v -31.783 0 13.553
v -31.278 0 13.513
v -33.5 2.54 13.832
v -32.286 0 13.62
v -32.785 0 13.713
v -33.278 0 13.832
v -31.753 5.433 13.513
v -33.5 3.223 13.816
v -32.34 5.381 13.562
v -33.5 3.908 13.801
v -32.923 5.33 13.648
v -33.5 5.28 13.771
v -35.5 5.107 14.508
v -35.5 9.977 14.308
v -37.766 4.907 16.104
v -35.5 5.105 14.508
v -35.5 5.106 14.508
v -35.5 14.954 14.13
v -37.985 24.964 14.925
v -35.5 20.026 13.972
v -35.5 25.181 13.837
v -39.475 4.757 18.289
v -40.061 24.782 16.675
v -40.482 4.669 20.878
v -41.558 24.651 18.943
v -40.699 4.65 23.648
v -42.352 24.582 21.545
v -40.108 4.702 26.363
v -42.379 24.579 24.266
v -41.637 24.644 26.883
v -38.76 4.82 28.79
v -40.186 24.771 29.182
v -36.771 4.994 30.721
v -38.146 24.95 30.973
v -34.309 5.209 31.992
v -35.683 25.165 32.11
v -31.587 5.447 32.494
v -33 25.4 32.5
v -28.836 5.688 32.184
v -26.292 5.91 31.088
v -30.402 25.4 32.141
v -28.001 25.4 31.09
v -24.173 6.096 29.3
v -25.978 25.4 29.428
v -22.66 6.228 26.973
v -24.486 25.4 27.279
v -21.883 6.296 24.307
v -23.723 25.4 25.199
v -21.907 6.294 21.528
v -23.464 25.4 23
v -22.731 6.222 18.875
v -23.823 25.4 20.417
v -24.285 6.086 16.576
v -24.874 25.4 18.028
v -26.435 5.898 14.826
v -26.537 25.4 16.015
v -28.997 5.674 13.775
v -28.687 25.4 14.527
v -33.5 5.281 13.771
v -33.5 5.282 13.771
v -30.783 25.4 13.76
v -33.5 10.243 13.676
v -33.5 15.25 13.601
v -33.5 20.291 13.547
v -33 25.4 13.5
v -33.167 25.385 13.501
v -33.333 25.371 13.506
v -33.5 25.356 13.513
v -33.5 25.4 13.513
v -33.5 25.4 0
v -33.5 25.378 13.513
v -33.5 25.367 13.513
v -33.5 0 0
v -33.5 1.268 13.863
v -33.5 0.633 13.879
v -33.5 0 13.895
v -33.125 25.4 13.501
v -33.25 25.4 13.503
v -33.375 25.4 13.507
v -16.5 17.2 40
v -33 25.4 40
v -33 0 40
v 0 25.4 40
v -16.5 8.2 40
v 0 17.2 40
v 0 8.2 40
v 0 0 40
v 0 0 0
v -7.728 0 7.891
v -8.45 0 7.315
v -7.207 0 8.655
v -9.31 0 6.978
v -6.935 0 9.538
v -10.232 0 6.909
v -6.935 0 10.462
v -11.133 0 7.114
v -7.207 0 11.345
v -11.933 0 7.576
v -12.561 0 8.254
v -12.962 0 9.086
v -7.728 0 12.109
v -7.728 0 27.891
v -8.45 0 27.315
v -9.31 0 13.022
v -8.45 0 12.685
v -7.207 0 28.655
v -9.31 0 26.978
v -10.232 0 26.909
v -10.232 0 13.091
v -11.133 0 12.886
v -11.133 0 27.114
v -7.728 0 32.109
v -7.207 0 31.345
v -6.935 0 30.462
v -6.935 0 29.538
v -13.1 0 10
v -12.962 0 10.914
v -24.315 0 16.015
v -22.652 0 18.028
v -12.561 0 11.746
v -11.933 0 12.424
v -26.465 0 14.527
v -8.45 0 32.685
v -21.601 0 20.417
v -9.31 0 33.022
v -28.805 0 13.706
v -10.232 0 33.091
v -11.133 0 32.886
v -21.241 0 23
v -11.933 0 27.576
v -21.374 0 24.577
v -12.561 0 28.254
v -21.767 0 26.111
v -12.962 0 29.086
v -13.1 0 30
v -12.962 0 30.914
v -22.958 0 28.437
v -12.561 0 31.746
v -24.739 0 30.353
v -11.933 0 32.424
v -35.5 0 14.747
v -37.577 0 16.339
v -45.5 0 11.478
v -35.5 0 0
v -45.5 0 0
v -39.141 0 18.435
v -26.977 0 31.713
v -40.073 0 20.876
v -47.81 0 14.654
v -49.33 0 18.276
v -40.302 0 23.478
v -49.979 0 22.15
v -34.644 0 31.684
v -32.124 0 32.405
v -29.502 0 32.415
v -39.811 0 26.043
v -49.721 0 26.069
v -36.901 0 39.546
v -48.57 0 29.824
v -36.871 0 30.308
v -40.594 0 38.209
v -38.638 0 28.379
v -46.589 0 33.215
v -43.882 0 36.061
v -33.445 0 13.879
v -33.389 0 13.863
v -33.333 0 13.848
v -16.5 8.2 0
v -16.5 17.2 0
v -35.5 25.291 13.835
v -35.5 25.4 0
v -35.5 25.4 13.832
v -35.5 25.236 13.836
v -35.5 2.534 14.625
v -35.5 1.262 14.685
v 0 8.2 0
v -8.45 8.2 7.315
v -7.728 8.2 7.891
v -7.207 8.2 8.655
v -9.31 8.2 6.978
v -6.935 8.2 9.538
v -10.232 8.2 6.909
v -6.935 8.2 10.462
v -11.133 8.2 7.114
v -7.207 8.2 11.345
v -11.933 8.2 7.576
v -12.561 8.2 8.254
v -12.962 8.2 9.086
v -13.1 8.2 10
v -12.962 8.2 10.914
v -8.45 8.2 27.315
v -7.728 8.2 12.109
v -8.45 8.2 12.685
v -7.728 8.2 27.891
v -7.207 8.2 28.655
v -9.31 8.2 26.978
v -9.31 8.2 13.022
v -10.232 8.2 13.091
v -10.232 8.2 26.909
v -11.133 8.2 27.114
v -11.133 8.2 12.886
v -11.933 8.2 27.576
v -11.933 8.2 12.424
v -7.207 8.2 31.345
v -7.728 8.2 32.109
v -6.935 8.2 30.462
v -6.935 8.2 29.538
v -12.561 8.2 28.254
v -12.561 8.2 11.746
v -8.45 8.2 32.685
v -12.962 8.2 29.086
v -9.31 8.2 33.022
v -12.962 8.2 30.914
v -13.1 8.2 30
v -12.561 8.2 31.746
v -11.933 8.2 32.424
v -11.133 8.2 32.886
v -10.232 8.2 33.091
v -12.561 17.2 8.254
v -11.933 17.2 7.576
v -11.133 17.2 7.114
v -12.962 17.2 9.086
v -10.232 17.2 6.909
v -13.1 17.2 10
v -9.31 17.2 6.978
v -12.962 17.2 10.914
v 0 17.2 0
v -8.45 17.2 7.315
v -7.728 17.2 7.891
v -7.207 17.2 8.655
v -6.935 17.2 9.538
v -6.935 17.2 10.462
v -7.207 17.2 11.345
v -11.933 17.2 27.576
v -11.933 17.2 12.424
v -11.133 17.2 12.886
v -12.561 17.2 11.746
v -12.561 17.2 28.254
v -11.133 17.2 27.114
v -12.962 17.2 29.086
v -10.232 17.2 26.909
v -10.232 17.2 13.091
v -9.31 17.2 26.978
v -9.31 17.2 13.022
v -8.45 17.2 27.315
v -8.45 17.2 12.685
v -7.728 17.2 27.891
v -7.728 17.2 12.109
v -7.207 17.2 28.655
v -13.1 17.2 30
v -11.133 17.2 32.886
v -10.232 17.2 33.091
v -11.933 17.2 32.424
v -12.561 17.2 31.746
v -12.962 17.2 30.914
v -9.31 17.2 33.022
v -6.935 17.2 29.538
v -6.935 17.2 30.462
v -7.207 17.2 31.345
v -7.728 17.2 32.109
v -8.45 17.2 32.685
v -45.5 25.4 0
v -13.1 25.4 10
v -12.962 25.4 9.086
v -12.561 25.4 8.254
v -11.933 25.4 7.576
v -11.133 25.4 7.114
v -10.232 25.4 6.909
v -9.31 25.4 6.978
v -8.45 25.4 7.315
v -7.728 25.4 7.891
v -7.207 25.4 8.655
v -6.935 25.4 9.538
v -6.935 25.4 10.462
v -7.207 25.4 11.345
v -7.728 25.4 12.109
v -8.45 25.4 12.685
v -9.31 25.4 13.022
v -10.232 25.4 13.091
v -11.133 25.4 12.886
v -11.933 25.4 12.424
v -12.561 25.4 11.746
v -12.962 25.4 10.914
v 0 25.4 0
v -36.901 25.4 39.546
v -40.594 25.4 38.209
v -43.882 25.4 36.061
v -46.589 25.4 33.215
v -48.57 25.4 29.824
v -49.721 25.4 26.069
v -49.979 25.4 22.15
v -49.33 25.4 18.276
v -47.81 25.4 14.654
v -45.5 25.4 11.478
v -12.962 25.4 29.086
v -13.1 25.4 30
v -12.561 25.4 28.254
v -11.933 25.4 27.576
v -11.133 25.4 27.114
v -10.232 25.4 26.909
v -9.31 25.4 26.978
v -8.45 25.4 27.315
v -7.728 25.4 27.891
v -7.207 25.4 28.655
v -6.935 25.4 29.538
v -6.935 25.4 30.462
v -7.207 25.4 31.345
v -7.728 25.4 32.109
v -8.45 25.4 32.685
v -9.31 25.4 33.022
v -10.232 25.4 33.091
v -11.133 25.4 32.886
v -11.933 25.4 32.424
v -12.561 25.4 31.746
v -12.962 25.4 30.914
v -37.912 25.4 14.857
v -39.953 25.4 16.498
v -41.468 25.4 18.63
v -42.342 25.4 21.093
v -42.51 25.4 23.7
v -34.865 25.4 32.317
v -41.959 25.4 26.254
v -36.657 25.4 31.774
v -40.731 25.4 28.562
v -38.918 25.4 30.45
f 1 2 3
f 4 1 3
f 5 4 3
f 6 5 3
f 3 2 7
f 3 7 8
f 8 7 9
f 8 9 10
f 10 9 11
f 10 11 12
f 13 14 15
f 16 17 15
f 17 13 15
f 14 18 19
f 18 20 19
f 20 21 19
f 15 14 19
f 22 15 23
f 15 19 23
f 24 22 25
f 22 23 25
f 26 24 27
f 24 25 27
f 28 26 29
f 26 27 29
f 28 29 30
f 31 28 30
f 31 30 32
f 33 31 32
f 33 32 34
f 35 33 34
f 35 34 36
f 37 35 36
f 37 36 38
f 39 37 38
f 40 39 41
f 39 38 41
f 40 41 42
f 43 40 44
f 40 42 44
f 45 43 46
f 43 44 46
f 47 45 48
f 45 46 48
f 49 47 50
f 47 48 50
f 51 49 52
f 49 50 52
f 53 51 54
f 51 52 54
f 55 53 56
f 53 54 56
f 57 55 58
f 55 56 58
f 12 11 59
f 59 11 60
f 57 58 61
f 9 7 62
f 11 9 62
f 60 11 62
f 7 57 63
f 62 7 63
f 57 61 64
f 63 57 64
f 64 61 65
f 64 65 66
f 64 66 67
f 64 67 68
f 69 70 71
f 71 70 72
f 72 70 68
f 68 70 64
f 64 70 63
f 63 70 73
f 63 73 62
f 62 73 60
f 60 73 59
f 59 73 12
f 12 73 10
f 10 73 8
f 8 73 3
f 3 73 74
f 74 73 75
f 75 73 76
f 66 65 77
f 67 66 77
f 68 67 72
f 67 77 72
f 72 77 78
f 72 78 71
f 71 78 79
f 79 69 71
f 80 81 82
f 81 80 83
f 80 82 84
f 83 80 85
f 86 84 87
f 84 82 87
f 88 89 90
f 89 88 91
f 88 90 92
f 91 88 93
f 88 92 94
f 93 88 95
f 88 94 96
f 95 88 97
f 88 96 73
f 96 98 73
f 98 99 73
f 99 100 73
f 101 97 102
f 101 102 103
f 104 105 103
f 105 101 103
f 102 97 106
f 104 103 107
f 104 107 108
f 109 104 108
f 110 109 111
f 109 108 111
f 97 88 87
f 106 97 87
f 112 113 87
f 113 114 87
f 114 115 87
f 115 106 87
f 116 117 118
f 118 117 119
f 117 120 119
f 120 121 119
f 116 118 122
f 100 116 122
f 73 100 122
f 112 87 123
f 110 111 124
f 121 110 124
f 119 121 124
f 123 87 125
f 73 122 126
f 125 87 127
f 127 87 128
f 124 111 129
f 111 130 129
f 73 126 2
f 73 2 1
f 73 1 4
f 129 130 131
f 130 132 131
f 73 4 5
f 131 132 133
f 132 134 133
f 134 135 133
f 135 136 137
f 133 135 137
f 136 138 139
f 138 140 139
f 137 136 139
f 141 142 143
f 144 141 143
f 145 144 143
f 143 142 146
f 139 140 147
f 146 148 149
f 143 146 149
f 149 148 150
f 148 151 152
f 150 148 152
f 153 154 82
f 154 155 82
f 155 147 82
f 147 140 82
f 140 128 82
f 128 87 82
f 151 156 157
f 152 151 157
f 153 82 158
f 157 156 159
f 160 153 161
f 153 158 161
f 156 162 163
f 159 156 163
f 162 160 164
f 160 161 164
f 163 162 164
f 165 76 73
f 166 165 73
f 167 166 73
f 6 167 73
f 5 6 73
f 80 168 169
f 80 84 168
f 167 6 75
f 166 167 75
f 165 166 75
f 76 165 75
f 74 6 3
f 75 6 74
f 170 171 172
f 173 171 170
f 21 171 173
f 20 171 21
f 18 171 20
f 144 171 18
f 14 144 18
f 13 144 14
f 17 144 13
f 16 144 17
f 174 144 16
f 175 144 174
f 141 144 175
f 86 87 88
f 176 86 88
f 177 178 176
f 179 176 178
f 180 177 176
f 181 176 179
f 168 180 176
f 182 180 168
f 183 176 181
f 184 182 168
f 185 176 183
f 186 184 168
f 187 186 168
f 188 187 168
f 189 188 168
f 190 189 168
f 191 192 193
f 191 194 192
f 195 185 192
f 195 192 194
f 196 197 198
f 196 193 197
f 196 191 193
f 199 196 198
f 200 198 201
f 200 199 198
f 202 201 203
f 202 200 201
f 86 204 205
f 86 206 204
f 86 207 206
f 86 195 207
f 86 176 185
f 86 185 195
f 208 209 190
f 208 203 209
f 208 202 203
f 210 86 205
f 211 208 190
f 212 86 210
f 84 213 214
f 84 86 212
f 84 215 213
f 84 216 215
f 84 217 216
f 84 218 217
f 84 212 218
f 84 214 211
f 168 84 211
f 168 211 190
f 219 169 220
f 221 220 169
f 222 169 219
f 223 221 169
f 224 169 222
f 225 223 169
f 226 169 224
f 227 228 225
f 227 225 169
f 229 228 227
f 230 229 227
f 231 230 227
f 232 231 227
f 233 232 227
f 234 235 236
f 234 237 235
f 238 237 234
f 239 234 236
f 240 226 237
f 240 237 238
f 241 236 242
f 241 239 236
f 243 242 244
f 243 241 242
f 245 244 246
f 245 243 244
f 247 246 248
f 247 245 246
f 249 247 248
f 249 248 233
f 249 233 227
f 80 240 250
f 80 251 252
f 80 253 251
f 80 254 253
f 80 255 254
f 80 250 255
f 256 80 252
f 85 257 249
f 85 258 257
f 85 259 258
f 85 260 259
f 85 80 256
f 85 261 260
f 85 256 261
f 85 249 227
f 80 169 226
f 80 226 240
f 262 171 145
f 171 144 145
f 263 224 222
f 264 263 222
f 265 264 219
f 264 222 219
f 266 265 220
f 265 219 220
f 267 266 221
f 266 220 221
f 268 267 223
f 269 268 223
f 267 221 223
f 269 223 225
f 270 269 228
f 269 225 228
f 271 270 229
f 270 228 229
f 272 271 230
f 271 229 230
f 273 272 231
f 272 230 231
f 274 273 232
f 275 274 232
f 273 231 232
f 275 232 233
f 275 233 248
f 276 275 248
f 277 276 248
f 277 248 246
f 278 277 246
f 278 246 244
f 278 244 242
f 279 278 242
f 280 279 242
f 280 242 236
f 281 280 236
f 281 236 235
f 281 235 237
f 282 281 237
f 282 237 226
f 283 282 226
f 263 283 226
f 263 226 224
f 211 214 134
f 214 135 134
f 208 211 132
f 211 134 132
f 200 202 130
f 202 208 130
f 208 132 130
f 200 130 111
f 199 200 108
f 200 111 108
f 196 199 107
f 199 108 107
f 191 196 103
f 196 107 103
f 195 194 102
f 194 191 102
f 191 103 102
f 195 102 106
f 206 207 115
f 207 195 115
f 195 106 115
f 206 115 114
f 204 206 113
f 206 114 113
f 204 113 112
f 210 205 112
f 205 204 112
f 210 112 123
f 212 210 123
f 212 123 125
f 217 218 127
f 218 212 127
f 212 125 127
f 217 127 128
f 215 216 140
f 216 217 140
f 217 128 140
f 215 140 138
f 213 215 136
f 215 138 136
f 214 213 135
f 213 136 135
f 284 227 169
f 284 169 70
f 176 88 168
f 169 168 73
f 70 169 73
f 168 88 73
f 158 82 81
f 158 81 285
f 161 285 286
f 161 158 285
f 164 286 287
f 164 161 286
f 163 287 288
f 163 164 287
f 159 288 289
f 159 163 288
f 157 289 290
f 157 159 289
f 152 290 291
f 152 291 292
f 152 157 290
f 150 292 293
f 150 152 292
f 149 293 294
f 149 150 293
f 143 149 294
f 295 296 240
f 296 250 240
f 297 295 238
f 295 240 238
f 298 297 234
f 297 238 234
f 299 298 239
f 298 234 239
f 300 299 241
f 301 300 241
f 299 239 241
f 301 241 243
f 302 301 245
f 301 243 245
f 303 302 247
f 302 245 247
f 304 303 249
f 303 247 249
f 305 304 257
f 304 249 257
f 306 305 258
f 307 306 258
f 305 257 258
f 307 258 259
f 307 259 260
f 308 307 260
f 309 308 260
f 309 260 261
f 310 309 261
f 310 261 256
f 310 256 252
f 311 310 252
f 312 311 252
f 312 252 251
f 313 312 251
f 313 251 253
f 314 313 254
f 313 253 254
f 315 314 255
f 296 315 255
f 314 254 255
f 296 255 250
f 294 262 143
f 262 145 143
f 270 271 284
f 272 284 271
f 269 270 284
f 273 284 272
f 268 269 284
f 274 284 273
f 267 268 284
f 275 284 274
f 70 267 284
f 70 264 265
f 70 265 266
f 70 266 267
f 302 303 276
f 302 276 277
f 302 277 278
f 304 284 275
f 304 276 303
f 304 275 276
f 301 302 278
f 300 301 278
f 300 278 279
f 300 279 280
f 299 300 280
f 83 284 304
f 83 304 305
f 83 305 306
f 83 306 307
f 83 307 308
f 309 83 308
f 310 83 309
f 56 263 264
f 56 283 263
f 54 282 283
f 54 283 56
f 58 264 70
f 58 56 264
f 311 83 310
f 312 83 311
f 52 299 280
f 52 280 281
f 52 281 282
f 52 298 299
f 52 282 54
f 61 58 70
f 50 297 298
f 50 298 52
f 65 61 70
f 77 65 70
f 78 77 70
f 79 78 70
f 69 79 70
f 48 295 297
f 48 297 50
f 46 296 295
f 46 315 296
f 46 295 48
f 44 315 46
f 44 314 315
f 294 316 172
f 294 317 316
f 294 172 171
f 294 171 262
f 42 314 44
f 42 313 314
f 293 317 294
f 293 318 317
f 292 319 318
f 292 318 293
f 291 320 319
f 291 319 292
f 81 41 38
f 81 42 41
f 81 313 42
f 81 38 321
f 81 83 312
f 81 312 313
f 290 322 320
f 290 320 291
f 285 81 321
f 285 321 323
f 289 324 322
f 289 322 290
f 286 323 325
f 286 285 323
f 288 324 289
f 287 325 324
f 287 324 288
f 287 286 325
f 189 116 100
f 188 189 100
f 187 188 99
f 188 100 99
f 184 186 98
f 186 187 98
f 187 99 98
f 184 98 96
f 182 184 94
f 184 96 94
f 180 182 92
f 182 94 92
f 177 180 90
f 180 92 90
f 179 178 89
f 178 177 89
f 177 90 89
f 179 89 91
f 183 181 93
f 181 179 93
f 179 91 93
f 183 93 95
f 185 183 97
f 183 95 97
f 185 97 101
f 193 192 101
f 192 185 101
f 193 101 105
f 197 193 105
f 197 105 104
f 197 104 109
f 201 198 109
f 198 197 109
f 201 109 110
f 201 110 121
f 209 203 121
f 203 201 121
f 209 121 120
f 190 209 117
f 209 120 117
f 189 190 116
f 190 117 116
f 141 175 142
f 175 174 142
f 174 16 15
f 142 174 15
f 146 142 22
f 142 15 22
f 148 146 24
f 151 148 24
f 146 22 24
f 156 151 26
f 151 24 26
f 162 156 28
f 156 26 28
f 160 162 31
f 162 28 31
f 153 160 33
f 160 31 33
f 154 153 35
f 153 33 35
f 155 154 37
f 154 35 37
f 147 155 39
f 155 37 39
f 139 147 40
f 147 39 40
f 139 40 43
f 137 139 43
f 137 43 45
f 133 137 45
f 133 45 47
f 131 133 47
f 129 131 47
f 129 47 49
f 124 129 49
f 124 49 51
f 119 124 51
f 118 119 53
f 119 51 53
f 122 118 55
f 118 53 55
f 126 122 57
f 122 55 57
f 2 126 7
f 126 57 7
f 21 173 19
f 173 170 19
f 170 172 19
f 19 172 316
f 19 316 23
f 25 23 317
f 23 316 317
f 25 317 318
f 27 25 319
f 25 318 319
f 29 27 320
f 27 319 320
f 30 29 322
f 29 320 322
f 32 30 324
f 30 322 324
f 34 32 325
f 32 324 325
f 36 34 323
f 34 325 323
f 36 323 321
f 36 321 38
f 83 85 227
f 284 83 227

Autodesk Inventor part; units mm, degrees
ref_plane "YZ Plane" through (0, 0, 0) normal (1, 0, 0) x (0, 1, 0)
ref_plane "XZ Plane" through (0, 0, 0) normal (0, 1, 0) x (-1, 0, 0)
ref_plane "XY Plane" through (0, 0, 0) normal (0, 0, 1) x (1, 0, 0)
sketch "Sketch1" plane through (0, 0, 0) normal (0, 1, 0) x (-1, 0, 0)
  line L0 (50, 0) -> (50, 40)
  line L1 (50, 40) -> (0, 40)
  line L2 (0, 40) -> (0, 0)
  line L3 (0, 0) -> (10, 0)
  line L4 (10, 0) -> (10, 10)
  line L5 (10, 10) -> (10, 30)
  circle A0 centre (10, 30) radius 3.1
  circle A1 centre (10, 10) radius 3.1
  line L6 (45.5, 0) -> (45.5, 11.4783)
  line L7 (0, 0) -> (33.5, 0)
  line L8 (35.5, 0) -> (35.5, 18.6699)
  line L9 (50, 40) -> (45.5, 40)
  line L10 (45.5, 40) -> (45.5, 35.5)
  line L11 (45.5, 35.5) -> (45.5, 34.5217)
  line L12 (45.5, 23) -> (33, 23)
  arc A2 (45.5, 11.4783) -> (33, 40) centre (33, 23) ccw
  line L13 (0, 0) -> (33.5, 0)
  line L14 (35.5, 0) -> (45.5, 0)
  line L15 (33.5, 0) -> (33.5, 18.0251)
  line L16 (0, 0) -> (33.5, 0)
  line L17 (35.5, 0) -> (45.5, 0)
  line L18 (33, 23) -> (28, 23)
  line L19 (33, 23) -> (38, 23)
  arc A3 (35.5, 18.6699) -> (38, 23) centre (33, 23) ccw
  arc A4 (28, 23) -> (33.5, 18.0251) centre (33, 23) ccw
  dimension "d0" = 50
  dimension "d1" = 40
  dimension "d2" = 10
  dimension "d3" = 10
  dimension "d4" = 20
  dimension "d5" = 6.2
  dimension "d6" = 6.2
  dimension "d7" = 45.5
  dimension "d8" = 35.5
  dimension "d9" = 4.5
  dimension "d10" = 4.5
  dimension "d13" = 12.5
  dimension "d14" = 12.5
  dimension "d15" = 2
extrude "Extrusion1" add sketch "Sketch1" along normal blind 25.4 contours A2 L6 L14 L8 A3 L12 L18 A4 L15 L7 L3 L2 L1
sketch "Sketch2" plane through (-33, 0, 40) normal (0, 0, 1) x (1, 0, 0)
  line L0 (33, 0) -> (33, 8.2)
  line L1 (33, 0) -> (33, 25.4) projected
  line L2 (33, 8.2) -> (16.5, 8.2)
  line L3 (16.5, 8.2) -> (16.5, 17.2)
  line L4 (16.5, 17.2) -> (33, 17.2)
  line L5 (33, 17.2) -> (33, 8.2)
  dimension "d18" = 8.2
  dimension "d19" = 16.5
  dimension "d20" = 9
extrude "Extrusion2" cut sketch "Sketch2" against normal through all
sketch "Sketch5" plane through (-28, 0, 23) normal (0, 0, -1) x (-1, 0, 0)
  line L0 (5, 25.4) -> (-4.4638, 26.228)
  line L1 (5, 25.4) -> (14.5, 25.4) construction
  line L2 (-4.4638, 26.228) -> (-3.5923, 36.1899)
  line L3 (-3.5923, 36.1899) -> (15.3354, 34.534)
  line L4 (15.3354, 34.534) -> (12.7207, 4.6481)
  line L5 (12.7207, 4.6481) -> (-6.207, 6.3041)
  line L6 (-6.207, 6.3041) -> (-3.5923, 36.1899)
  line L7 (3.2569, 5.4761) -> (5.8716, 35.3619)
  point P0 (-28, 0)
  dimension "d25" = 9.5
  dimension "d26" = 175
  dimension "d27" = 10
  dimension "d28" = 19
  dimension "d29" = 30
  dimension "d30" = 90
  dimension "d31" = 19
revolve "Revolution1" cut sketch "Sketch5" angle 360 about axis through (-31.2569, 5.4761, 23) along (-0.0871557, 0.9961947, 0) contours L7 L5 L6 L0 | L0 L2 L3 L7
sketch "Sketch6" plane through (-33.5, 5.2799, 18.0251) normal (-0.0871557, 0.9961947, 0) x (0.9961947, 0.0871557, 0)
  arc A0 (-0.2388, 4.1928) -> (1.7536, 4.512) centre (2.2517, -4.9749) ccw projected
  circle A1 centre (2.2517, -4.9749) radius 9.5
  point P0 (32.9124, 18.0251)
extrude "Extrusion3" cut sketch "Sketch6" against normal blind 10
properties part number "suporte-eixo"
